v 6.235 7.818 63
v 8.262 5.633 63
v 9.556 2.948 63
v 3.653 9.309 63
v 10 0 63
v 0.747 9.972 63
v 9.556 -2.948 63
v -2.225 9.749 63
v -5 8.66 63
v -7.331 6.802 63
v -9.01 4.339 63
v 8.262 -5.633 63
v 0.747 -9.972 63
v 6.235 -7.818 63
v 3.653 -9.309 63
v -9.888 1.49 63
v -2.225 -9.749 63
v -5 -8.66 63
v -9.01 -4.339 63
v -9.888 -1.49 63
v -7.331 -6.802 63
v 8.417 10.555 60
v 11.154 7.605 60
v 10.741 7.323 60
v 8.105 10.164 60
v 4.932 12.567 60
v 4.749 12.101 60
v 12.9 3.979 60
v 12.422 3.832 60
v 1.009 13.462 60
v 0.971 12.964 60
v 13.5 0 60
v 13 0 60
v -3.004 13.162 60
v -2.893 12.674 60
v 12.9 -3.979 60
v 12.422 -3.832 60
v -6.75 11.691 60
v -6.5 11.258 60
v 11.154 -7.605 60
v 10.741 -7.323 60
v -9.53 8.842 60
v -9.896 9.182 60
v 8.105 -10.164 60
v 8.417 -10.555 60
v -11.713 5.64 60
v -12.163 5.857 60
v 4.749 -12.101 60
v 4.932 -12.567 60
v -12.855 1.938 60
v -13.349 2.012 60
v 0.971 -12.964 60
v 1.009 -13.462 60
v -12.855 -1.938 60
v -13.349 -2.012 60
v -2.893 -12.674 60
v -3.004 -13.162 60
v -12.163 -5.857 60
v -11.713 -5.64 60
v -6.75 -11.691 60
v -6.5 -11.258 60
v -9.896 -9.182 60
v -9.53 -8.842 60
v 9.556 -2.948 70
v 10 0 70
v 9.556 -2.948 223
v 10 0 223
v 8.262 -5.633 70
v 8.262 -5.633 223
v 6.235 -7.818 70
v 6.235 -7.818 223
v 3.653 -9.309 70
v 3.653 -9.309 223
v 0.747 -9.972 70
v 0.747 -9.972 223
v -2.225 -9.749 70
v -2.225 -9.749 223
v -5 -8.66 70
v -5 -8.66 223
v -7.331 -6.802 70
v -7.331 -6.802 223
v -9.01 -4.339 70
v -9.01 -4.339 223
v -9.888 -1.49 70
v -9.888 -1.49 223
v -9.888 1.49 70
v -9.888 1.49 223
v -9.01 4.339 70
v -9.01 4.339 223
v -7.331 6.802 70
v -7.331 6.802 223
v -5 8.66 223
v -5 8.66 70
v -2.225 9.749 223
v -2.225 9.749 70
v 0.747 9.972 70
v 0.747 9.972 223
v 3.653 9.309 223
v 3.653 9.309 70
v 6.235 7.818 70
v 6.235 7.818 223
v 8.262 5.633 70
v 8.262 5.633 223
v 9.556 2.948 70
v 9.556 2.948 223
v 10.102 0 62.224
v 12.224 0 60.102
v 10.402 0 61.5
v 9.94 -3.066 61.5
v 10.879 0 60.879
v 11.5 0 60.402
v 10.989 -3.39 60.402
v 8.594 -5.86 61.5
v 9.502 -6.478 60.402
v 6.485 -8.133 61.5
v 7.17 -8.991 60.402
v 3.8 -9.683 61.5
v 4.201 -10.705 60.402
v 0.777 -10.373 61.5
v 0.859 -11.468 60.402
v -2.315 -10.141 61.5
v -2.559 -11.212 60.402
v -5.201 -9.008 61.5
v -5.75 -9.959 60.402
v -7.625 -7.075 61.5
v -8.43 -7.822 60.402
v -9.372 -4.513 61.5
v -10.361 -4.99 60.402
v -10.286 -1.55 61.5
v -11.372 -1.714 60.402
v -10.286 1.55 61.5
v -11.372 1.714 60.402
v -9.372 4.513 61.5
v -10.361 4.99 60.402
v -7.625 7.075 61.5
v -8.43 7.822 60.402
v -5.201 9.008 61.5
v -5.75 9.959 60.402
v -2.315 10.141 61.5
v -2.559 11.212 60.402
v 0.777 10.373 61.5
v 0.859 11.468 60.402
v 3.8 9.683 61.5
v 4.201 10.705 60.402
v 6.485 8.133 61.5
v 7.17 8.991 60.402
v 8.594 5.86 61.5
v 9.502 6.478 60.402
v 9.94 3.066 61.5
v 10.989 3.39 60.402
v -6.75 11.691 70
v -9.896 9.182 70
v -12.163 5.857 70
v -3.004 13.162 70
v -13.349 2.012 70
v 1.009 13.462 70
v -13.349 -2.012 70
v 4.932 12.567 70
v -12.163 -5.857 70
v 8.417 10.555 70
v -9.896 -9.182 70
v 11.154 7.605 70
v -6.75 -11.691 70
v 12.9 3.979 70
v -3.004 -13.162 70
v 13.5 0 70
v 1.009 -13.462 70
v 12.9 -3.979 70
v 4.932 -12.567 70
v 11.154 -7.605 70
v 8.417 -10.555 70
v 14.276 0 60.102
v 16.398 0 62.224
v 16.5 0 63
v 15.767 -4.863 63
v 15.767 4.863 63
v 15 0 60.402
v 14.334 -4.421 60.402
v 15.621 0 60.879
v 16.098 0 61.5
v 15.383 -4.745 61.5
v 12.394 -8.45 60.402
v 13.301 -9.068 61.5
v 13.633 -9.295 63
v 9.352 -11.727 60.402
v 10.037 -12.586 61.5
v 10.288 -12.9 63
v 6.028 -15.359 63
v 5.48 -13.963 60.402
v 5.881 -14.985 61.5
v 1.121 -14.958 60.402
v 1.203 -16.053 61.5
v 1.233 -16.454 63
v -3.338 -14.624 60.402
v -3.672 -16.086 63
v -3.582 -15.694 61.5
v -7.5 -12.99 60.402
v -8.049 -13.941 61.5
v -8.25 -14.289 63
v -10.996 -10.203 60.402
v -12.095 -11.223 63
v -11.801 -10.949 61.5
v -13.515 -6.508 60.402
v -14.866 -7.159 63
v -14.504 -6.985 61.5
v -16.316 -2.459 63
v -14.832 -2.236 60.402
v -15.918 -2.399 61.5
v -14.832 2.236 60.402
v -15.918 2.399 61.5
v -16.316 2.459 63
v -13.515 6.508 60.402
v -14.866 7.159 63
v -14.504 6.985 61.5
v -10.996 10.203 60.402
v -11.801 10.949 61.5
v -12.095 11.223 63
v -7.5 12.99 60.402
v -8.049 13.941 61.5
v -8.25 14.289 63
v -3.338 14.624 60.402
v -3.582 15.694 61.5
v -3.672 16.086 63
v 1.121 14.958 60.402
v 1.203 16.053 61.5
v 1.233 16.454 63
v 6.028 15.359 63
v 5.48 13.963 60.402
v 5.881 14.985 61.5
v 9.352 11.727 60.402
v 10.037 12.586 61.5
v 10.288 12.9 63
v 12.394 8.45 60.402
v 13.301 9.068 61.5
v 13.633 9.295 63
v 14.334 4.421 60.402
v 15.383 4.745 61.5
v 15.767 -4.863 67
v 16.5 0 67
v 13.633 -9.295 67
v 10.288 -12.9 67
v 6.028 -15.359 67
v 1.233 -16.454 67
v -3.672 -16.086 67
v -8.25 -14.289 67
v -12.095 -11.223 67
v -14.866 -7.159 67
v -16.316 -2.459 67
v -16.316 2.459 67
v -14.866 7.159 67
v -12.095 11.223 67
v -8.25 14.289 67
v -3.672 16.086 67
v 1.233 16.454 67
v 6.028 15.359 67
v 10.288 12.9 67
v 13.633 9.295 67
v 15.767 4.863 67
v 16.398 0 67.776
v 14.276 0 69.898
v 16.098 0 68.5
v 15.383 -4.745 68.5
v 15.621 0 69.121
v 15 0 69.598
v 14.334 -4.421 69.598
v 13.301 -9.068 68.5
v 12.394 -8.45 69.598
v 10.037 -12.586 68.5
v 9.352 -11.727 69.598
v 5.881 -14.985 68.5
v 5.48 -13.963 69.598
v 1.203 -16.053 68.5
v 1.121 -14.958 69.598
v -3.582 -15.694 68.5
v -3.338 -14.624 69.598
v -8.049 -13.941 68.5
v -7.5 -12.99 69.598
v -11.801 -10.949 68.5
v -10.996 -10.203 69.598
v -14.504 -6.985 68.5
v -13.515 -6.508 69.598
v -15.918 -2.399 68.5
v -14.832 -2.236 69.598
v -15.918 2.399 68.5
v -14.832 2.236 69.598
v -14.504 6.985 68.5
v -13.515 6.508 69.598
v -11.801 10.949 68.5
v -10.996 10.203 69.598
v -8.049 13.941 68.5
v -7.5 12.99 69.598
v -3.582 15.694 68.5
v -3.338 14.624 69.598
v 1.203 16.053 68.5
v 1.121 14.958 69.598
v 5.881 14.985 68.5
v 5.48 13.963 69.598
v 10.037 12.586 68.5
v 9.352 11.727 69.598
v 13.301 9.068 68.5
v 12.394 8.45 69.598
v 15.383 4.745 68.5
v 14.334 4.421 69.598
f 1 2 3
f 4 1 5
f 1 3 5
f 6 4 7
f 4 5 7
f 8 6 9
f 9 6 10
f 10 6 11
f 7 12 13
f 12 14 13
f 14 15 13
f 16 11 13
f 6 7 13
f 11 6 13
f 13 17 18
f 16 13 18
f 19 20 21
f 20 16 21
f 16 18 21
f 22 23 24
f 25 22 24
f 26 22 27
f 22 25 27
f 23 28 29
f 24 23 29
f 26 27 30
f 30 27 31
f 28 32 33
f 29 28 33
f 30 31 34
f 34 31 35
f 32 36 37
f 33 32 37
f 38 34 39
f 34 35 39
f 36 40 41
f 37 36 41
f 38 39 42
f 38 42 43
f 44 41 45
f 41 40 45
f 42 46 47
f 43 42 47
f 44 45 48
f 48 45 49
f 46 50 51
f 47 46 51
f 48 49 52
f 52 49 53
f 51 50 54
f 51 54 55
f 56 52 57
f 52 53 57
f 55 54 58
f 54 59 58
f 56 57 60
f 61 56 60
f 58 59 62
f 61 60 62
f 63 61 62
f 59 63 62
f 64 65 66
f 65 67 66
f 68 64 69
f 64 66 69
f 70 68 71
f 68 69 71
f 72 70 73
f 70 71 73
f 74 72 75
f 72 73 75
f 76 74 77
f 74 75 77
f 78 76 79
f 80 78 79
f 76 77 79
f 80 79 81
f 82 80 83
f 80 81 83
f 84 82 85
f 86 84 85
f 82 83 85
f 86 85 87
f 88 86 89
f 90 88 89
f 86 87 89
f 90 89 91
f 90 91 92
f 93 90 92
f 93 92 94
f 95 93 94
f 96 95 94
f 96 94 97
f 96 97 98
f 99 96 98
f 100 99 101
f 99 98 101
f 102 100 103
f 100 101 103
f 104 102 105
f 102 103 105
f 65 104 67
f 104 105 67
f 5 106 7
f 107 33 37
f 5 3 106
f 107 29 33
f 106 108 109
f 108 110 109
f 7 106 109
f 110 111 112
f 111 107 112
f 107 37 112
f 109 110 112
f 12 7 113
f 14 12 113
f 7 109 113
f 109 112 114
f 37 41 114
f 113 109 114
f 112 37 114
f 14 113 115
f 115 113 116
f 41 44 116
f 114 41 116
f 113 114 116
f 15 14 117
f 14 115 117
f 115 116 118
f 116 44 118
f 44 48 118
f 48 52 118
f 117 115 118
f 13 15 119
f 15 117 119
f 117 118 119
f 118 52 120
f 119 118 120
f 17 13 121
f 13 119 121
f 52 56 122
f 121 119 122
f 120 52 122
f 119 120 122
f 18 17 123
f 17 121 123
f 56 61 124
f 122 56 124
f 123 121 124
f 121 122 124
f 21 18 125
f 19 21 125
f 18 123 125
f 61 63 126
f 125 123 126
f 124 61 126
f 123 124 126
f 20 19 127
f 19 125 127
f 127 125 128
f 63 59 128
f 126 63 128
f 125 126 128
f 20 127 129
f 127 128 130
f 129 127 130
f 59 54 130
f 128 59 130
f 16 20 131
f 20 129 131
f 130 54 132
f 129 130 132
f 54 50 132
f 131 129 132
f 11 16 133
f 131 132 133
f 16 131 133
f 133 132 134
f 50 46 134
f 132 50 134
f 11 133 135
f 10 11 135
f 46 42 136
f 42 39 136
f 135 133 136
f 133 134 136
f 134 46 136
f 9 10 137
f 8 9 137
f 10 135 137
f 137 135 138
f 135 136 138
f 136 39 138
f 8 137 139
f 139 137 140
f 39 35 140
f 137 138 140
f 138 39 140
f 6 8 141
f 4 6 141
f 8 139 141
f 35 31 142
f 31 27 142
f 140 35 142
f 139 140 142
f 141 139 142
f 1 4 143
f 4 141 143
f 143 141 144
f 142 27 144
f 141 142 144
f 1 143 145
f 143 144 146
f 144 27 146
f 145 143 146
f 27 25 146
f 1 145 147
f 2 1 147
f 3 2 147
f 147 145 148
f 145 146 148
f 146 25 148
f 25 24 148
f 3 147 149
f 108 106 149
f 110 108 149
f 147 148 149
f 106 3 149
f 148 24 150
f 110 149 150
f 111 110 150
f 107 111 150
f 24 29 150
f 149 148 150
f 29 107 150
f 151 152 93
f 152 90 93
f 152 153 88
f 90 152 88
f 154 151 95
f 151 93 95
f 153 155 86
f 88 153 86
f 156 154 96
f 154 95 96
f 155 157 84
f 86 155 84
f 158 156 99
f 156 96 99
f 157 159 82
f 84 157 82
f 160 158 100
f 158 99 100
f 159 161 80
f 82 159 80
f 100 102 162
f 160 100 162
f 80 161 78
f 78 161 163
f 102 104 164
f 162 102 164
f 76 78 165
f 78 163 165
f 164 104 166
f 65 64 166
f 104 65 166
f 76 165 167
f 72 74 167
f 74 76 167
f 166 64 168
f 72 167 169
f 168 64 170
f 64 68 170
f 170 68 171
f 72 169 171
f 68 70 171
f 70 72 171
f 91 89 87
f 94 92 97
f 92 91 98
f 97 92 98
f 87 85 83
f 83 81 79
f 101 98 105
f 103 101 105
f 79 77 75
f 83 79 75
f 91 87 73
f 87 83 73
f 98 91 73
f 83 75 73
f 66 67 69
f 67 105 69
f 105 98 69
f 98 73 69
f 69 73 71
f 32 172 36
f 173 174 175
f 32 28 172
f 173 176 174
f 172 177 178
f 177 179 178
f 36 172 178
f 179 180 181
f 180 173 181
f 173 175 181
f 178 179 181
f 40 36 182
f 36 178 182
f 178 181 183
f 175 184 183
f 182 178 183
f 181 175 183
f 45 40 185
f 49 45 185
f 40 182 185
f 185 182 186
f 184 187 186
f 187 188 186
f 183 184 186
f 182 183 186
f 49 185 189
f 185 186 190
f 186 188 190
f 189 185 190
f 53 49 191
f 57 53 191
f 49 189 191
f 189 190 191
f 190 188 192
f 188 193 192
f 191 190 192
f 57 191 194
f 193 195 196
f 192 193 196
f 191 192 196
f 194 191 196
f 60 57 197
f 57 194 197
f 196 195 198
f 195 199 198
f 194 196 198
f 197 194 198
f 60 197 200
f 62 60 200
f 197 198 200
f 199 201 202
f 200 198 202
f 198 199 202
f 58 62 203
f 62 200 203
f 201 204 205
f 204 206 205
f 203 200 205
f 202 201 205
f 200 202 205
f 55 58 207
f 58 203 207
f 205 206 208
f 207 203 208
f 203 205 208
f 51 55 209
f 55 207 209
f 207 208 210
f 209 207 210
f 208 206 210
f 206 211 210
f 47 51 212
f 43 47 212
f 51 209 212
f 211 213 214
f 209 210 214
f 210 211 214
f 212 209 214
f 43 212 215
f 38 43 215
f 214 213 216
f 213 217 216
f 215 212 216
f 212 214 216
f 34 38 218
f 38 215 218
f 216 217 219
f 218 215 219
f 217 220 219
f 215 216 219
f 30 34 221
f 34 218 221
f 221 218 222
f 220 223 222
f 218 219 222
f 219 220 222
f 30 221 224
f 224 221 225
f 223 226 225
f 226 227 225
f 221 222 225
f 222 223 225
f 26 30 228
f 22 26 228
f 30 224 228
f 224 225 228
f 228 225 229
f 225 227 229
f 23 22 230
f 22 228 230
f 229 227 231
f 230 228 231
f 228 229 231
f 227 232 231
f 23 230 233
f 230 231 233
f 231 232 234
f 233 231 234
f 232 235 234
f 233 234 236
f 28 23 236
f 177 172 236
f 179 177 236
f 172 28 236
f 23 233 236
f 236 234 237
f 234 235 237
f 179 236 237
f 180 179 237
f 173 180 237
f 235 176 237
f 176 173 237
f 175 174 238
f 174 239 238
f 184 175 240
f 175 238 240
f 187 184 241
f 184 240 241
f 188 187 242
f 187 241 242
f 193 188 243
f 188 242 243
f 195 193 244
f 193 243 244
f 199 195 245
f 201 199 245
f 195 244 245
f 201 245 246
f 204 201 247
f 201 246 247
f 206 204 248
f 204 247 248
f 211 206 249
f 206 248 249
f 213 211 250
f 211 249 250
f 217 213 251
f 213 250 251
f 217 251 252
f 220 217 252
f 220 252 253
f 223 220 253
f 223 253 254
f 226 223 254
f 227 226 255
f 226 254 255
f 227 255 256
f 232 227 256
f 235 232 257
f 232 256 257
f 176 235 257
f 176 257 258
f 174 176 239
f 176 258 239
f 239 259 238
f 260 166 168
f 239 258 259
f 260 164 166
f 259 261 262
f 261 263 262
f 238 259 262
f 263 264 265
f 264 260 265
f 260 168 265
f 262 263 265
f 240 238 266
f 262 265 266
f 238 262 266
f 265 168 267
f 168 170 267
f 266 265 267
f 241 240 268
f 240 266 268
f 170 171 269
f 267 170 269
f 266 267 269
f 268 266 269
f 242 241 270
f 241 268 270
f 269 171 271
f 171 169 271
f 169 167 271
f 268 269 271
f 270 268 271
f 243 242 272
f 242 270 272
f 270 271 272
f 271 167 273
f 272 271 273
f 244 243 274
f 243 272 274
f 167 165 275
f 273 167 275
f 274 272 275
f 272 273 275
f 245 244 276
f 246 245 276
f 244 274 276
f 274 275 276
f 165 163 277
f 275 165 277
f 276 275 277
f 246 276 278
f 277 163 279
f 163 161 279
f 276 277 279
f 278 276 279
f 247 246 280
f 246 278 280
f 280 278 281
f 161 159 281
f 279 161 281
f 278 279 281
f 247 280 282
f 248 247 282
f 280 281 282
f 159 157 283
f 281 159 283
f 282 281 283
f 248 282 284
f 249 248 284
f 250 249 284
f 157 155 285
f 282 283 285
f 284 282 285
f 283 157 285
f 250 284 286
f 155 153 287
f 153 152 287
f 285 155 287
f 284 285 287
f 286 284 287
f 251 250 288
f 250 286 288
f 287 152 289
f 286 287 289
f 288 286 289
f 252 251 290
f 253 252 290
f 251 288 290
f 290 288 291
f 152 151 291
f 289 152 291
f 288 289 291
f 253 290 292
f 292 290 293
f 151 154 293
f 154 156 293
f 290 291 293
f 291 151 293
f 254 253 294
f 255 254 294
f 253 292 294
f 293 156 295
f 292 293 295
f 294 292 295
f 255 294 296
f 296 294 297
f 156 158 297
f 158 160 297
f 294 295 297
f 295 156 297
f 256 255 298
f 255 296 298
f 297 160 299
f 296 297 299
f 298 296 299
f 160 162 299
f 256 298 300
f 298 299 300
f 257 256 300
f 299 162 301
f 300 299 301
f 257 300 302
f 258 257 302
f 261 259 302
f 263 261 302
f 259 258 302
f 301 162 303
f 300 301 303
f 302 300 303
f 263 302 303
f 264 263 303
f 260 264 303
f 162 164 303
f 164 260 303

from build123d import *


with BuildPart() as part:
    # Sketch1 → Revolve1 (revolve)
    with BuildSketch(Plane.XZ):
        with BuildLine():
            Line((10, 223), (0, 223))
            Line((0, 223), (0, 63))
            Line((0, 63), (10, 63))
            ThreePointArc((10, 63), (10.878679656, 60.878679656), (13, 60))
            Line((13, 60), (13.5, 60))
            ThreePointArc((13.5, 60), (15.621320344, 60.878679656), (16.5, 63))
            Line((16.5, 63), (16.5, 67))
            ThreePointArc((16.5, 67), (15.621320344, 69.121320344), (13.5, 70))
            Line((13.5, 70), (10, 70))
            Line((10, 70), (10, 223))
        make_face()
    revolve(axis=Axis((0, 0, 223), (0, 0, -1)))


solid = part.part
